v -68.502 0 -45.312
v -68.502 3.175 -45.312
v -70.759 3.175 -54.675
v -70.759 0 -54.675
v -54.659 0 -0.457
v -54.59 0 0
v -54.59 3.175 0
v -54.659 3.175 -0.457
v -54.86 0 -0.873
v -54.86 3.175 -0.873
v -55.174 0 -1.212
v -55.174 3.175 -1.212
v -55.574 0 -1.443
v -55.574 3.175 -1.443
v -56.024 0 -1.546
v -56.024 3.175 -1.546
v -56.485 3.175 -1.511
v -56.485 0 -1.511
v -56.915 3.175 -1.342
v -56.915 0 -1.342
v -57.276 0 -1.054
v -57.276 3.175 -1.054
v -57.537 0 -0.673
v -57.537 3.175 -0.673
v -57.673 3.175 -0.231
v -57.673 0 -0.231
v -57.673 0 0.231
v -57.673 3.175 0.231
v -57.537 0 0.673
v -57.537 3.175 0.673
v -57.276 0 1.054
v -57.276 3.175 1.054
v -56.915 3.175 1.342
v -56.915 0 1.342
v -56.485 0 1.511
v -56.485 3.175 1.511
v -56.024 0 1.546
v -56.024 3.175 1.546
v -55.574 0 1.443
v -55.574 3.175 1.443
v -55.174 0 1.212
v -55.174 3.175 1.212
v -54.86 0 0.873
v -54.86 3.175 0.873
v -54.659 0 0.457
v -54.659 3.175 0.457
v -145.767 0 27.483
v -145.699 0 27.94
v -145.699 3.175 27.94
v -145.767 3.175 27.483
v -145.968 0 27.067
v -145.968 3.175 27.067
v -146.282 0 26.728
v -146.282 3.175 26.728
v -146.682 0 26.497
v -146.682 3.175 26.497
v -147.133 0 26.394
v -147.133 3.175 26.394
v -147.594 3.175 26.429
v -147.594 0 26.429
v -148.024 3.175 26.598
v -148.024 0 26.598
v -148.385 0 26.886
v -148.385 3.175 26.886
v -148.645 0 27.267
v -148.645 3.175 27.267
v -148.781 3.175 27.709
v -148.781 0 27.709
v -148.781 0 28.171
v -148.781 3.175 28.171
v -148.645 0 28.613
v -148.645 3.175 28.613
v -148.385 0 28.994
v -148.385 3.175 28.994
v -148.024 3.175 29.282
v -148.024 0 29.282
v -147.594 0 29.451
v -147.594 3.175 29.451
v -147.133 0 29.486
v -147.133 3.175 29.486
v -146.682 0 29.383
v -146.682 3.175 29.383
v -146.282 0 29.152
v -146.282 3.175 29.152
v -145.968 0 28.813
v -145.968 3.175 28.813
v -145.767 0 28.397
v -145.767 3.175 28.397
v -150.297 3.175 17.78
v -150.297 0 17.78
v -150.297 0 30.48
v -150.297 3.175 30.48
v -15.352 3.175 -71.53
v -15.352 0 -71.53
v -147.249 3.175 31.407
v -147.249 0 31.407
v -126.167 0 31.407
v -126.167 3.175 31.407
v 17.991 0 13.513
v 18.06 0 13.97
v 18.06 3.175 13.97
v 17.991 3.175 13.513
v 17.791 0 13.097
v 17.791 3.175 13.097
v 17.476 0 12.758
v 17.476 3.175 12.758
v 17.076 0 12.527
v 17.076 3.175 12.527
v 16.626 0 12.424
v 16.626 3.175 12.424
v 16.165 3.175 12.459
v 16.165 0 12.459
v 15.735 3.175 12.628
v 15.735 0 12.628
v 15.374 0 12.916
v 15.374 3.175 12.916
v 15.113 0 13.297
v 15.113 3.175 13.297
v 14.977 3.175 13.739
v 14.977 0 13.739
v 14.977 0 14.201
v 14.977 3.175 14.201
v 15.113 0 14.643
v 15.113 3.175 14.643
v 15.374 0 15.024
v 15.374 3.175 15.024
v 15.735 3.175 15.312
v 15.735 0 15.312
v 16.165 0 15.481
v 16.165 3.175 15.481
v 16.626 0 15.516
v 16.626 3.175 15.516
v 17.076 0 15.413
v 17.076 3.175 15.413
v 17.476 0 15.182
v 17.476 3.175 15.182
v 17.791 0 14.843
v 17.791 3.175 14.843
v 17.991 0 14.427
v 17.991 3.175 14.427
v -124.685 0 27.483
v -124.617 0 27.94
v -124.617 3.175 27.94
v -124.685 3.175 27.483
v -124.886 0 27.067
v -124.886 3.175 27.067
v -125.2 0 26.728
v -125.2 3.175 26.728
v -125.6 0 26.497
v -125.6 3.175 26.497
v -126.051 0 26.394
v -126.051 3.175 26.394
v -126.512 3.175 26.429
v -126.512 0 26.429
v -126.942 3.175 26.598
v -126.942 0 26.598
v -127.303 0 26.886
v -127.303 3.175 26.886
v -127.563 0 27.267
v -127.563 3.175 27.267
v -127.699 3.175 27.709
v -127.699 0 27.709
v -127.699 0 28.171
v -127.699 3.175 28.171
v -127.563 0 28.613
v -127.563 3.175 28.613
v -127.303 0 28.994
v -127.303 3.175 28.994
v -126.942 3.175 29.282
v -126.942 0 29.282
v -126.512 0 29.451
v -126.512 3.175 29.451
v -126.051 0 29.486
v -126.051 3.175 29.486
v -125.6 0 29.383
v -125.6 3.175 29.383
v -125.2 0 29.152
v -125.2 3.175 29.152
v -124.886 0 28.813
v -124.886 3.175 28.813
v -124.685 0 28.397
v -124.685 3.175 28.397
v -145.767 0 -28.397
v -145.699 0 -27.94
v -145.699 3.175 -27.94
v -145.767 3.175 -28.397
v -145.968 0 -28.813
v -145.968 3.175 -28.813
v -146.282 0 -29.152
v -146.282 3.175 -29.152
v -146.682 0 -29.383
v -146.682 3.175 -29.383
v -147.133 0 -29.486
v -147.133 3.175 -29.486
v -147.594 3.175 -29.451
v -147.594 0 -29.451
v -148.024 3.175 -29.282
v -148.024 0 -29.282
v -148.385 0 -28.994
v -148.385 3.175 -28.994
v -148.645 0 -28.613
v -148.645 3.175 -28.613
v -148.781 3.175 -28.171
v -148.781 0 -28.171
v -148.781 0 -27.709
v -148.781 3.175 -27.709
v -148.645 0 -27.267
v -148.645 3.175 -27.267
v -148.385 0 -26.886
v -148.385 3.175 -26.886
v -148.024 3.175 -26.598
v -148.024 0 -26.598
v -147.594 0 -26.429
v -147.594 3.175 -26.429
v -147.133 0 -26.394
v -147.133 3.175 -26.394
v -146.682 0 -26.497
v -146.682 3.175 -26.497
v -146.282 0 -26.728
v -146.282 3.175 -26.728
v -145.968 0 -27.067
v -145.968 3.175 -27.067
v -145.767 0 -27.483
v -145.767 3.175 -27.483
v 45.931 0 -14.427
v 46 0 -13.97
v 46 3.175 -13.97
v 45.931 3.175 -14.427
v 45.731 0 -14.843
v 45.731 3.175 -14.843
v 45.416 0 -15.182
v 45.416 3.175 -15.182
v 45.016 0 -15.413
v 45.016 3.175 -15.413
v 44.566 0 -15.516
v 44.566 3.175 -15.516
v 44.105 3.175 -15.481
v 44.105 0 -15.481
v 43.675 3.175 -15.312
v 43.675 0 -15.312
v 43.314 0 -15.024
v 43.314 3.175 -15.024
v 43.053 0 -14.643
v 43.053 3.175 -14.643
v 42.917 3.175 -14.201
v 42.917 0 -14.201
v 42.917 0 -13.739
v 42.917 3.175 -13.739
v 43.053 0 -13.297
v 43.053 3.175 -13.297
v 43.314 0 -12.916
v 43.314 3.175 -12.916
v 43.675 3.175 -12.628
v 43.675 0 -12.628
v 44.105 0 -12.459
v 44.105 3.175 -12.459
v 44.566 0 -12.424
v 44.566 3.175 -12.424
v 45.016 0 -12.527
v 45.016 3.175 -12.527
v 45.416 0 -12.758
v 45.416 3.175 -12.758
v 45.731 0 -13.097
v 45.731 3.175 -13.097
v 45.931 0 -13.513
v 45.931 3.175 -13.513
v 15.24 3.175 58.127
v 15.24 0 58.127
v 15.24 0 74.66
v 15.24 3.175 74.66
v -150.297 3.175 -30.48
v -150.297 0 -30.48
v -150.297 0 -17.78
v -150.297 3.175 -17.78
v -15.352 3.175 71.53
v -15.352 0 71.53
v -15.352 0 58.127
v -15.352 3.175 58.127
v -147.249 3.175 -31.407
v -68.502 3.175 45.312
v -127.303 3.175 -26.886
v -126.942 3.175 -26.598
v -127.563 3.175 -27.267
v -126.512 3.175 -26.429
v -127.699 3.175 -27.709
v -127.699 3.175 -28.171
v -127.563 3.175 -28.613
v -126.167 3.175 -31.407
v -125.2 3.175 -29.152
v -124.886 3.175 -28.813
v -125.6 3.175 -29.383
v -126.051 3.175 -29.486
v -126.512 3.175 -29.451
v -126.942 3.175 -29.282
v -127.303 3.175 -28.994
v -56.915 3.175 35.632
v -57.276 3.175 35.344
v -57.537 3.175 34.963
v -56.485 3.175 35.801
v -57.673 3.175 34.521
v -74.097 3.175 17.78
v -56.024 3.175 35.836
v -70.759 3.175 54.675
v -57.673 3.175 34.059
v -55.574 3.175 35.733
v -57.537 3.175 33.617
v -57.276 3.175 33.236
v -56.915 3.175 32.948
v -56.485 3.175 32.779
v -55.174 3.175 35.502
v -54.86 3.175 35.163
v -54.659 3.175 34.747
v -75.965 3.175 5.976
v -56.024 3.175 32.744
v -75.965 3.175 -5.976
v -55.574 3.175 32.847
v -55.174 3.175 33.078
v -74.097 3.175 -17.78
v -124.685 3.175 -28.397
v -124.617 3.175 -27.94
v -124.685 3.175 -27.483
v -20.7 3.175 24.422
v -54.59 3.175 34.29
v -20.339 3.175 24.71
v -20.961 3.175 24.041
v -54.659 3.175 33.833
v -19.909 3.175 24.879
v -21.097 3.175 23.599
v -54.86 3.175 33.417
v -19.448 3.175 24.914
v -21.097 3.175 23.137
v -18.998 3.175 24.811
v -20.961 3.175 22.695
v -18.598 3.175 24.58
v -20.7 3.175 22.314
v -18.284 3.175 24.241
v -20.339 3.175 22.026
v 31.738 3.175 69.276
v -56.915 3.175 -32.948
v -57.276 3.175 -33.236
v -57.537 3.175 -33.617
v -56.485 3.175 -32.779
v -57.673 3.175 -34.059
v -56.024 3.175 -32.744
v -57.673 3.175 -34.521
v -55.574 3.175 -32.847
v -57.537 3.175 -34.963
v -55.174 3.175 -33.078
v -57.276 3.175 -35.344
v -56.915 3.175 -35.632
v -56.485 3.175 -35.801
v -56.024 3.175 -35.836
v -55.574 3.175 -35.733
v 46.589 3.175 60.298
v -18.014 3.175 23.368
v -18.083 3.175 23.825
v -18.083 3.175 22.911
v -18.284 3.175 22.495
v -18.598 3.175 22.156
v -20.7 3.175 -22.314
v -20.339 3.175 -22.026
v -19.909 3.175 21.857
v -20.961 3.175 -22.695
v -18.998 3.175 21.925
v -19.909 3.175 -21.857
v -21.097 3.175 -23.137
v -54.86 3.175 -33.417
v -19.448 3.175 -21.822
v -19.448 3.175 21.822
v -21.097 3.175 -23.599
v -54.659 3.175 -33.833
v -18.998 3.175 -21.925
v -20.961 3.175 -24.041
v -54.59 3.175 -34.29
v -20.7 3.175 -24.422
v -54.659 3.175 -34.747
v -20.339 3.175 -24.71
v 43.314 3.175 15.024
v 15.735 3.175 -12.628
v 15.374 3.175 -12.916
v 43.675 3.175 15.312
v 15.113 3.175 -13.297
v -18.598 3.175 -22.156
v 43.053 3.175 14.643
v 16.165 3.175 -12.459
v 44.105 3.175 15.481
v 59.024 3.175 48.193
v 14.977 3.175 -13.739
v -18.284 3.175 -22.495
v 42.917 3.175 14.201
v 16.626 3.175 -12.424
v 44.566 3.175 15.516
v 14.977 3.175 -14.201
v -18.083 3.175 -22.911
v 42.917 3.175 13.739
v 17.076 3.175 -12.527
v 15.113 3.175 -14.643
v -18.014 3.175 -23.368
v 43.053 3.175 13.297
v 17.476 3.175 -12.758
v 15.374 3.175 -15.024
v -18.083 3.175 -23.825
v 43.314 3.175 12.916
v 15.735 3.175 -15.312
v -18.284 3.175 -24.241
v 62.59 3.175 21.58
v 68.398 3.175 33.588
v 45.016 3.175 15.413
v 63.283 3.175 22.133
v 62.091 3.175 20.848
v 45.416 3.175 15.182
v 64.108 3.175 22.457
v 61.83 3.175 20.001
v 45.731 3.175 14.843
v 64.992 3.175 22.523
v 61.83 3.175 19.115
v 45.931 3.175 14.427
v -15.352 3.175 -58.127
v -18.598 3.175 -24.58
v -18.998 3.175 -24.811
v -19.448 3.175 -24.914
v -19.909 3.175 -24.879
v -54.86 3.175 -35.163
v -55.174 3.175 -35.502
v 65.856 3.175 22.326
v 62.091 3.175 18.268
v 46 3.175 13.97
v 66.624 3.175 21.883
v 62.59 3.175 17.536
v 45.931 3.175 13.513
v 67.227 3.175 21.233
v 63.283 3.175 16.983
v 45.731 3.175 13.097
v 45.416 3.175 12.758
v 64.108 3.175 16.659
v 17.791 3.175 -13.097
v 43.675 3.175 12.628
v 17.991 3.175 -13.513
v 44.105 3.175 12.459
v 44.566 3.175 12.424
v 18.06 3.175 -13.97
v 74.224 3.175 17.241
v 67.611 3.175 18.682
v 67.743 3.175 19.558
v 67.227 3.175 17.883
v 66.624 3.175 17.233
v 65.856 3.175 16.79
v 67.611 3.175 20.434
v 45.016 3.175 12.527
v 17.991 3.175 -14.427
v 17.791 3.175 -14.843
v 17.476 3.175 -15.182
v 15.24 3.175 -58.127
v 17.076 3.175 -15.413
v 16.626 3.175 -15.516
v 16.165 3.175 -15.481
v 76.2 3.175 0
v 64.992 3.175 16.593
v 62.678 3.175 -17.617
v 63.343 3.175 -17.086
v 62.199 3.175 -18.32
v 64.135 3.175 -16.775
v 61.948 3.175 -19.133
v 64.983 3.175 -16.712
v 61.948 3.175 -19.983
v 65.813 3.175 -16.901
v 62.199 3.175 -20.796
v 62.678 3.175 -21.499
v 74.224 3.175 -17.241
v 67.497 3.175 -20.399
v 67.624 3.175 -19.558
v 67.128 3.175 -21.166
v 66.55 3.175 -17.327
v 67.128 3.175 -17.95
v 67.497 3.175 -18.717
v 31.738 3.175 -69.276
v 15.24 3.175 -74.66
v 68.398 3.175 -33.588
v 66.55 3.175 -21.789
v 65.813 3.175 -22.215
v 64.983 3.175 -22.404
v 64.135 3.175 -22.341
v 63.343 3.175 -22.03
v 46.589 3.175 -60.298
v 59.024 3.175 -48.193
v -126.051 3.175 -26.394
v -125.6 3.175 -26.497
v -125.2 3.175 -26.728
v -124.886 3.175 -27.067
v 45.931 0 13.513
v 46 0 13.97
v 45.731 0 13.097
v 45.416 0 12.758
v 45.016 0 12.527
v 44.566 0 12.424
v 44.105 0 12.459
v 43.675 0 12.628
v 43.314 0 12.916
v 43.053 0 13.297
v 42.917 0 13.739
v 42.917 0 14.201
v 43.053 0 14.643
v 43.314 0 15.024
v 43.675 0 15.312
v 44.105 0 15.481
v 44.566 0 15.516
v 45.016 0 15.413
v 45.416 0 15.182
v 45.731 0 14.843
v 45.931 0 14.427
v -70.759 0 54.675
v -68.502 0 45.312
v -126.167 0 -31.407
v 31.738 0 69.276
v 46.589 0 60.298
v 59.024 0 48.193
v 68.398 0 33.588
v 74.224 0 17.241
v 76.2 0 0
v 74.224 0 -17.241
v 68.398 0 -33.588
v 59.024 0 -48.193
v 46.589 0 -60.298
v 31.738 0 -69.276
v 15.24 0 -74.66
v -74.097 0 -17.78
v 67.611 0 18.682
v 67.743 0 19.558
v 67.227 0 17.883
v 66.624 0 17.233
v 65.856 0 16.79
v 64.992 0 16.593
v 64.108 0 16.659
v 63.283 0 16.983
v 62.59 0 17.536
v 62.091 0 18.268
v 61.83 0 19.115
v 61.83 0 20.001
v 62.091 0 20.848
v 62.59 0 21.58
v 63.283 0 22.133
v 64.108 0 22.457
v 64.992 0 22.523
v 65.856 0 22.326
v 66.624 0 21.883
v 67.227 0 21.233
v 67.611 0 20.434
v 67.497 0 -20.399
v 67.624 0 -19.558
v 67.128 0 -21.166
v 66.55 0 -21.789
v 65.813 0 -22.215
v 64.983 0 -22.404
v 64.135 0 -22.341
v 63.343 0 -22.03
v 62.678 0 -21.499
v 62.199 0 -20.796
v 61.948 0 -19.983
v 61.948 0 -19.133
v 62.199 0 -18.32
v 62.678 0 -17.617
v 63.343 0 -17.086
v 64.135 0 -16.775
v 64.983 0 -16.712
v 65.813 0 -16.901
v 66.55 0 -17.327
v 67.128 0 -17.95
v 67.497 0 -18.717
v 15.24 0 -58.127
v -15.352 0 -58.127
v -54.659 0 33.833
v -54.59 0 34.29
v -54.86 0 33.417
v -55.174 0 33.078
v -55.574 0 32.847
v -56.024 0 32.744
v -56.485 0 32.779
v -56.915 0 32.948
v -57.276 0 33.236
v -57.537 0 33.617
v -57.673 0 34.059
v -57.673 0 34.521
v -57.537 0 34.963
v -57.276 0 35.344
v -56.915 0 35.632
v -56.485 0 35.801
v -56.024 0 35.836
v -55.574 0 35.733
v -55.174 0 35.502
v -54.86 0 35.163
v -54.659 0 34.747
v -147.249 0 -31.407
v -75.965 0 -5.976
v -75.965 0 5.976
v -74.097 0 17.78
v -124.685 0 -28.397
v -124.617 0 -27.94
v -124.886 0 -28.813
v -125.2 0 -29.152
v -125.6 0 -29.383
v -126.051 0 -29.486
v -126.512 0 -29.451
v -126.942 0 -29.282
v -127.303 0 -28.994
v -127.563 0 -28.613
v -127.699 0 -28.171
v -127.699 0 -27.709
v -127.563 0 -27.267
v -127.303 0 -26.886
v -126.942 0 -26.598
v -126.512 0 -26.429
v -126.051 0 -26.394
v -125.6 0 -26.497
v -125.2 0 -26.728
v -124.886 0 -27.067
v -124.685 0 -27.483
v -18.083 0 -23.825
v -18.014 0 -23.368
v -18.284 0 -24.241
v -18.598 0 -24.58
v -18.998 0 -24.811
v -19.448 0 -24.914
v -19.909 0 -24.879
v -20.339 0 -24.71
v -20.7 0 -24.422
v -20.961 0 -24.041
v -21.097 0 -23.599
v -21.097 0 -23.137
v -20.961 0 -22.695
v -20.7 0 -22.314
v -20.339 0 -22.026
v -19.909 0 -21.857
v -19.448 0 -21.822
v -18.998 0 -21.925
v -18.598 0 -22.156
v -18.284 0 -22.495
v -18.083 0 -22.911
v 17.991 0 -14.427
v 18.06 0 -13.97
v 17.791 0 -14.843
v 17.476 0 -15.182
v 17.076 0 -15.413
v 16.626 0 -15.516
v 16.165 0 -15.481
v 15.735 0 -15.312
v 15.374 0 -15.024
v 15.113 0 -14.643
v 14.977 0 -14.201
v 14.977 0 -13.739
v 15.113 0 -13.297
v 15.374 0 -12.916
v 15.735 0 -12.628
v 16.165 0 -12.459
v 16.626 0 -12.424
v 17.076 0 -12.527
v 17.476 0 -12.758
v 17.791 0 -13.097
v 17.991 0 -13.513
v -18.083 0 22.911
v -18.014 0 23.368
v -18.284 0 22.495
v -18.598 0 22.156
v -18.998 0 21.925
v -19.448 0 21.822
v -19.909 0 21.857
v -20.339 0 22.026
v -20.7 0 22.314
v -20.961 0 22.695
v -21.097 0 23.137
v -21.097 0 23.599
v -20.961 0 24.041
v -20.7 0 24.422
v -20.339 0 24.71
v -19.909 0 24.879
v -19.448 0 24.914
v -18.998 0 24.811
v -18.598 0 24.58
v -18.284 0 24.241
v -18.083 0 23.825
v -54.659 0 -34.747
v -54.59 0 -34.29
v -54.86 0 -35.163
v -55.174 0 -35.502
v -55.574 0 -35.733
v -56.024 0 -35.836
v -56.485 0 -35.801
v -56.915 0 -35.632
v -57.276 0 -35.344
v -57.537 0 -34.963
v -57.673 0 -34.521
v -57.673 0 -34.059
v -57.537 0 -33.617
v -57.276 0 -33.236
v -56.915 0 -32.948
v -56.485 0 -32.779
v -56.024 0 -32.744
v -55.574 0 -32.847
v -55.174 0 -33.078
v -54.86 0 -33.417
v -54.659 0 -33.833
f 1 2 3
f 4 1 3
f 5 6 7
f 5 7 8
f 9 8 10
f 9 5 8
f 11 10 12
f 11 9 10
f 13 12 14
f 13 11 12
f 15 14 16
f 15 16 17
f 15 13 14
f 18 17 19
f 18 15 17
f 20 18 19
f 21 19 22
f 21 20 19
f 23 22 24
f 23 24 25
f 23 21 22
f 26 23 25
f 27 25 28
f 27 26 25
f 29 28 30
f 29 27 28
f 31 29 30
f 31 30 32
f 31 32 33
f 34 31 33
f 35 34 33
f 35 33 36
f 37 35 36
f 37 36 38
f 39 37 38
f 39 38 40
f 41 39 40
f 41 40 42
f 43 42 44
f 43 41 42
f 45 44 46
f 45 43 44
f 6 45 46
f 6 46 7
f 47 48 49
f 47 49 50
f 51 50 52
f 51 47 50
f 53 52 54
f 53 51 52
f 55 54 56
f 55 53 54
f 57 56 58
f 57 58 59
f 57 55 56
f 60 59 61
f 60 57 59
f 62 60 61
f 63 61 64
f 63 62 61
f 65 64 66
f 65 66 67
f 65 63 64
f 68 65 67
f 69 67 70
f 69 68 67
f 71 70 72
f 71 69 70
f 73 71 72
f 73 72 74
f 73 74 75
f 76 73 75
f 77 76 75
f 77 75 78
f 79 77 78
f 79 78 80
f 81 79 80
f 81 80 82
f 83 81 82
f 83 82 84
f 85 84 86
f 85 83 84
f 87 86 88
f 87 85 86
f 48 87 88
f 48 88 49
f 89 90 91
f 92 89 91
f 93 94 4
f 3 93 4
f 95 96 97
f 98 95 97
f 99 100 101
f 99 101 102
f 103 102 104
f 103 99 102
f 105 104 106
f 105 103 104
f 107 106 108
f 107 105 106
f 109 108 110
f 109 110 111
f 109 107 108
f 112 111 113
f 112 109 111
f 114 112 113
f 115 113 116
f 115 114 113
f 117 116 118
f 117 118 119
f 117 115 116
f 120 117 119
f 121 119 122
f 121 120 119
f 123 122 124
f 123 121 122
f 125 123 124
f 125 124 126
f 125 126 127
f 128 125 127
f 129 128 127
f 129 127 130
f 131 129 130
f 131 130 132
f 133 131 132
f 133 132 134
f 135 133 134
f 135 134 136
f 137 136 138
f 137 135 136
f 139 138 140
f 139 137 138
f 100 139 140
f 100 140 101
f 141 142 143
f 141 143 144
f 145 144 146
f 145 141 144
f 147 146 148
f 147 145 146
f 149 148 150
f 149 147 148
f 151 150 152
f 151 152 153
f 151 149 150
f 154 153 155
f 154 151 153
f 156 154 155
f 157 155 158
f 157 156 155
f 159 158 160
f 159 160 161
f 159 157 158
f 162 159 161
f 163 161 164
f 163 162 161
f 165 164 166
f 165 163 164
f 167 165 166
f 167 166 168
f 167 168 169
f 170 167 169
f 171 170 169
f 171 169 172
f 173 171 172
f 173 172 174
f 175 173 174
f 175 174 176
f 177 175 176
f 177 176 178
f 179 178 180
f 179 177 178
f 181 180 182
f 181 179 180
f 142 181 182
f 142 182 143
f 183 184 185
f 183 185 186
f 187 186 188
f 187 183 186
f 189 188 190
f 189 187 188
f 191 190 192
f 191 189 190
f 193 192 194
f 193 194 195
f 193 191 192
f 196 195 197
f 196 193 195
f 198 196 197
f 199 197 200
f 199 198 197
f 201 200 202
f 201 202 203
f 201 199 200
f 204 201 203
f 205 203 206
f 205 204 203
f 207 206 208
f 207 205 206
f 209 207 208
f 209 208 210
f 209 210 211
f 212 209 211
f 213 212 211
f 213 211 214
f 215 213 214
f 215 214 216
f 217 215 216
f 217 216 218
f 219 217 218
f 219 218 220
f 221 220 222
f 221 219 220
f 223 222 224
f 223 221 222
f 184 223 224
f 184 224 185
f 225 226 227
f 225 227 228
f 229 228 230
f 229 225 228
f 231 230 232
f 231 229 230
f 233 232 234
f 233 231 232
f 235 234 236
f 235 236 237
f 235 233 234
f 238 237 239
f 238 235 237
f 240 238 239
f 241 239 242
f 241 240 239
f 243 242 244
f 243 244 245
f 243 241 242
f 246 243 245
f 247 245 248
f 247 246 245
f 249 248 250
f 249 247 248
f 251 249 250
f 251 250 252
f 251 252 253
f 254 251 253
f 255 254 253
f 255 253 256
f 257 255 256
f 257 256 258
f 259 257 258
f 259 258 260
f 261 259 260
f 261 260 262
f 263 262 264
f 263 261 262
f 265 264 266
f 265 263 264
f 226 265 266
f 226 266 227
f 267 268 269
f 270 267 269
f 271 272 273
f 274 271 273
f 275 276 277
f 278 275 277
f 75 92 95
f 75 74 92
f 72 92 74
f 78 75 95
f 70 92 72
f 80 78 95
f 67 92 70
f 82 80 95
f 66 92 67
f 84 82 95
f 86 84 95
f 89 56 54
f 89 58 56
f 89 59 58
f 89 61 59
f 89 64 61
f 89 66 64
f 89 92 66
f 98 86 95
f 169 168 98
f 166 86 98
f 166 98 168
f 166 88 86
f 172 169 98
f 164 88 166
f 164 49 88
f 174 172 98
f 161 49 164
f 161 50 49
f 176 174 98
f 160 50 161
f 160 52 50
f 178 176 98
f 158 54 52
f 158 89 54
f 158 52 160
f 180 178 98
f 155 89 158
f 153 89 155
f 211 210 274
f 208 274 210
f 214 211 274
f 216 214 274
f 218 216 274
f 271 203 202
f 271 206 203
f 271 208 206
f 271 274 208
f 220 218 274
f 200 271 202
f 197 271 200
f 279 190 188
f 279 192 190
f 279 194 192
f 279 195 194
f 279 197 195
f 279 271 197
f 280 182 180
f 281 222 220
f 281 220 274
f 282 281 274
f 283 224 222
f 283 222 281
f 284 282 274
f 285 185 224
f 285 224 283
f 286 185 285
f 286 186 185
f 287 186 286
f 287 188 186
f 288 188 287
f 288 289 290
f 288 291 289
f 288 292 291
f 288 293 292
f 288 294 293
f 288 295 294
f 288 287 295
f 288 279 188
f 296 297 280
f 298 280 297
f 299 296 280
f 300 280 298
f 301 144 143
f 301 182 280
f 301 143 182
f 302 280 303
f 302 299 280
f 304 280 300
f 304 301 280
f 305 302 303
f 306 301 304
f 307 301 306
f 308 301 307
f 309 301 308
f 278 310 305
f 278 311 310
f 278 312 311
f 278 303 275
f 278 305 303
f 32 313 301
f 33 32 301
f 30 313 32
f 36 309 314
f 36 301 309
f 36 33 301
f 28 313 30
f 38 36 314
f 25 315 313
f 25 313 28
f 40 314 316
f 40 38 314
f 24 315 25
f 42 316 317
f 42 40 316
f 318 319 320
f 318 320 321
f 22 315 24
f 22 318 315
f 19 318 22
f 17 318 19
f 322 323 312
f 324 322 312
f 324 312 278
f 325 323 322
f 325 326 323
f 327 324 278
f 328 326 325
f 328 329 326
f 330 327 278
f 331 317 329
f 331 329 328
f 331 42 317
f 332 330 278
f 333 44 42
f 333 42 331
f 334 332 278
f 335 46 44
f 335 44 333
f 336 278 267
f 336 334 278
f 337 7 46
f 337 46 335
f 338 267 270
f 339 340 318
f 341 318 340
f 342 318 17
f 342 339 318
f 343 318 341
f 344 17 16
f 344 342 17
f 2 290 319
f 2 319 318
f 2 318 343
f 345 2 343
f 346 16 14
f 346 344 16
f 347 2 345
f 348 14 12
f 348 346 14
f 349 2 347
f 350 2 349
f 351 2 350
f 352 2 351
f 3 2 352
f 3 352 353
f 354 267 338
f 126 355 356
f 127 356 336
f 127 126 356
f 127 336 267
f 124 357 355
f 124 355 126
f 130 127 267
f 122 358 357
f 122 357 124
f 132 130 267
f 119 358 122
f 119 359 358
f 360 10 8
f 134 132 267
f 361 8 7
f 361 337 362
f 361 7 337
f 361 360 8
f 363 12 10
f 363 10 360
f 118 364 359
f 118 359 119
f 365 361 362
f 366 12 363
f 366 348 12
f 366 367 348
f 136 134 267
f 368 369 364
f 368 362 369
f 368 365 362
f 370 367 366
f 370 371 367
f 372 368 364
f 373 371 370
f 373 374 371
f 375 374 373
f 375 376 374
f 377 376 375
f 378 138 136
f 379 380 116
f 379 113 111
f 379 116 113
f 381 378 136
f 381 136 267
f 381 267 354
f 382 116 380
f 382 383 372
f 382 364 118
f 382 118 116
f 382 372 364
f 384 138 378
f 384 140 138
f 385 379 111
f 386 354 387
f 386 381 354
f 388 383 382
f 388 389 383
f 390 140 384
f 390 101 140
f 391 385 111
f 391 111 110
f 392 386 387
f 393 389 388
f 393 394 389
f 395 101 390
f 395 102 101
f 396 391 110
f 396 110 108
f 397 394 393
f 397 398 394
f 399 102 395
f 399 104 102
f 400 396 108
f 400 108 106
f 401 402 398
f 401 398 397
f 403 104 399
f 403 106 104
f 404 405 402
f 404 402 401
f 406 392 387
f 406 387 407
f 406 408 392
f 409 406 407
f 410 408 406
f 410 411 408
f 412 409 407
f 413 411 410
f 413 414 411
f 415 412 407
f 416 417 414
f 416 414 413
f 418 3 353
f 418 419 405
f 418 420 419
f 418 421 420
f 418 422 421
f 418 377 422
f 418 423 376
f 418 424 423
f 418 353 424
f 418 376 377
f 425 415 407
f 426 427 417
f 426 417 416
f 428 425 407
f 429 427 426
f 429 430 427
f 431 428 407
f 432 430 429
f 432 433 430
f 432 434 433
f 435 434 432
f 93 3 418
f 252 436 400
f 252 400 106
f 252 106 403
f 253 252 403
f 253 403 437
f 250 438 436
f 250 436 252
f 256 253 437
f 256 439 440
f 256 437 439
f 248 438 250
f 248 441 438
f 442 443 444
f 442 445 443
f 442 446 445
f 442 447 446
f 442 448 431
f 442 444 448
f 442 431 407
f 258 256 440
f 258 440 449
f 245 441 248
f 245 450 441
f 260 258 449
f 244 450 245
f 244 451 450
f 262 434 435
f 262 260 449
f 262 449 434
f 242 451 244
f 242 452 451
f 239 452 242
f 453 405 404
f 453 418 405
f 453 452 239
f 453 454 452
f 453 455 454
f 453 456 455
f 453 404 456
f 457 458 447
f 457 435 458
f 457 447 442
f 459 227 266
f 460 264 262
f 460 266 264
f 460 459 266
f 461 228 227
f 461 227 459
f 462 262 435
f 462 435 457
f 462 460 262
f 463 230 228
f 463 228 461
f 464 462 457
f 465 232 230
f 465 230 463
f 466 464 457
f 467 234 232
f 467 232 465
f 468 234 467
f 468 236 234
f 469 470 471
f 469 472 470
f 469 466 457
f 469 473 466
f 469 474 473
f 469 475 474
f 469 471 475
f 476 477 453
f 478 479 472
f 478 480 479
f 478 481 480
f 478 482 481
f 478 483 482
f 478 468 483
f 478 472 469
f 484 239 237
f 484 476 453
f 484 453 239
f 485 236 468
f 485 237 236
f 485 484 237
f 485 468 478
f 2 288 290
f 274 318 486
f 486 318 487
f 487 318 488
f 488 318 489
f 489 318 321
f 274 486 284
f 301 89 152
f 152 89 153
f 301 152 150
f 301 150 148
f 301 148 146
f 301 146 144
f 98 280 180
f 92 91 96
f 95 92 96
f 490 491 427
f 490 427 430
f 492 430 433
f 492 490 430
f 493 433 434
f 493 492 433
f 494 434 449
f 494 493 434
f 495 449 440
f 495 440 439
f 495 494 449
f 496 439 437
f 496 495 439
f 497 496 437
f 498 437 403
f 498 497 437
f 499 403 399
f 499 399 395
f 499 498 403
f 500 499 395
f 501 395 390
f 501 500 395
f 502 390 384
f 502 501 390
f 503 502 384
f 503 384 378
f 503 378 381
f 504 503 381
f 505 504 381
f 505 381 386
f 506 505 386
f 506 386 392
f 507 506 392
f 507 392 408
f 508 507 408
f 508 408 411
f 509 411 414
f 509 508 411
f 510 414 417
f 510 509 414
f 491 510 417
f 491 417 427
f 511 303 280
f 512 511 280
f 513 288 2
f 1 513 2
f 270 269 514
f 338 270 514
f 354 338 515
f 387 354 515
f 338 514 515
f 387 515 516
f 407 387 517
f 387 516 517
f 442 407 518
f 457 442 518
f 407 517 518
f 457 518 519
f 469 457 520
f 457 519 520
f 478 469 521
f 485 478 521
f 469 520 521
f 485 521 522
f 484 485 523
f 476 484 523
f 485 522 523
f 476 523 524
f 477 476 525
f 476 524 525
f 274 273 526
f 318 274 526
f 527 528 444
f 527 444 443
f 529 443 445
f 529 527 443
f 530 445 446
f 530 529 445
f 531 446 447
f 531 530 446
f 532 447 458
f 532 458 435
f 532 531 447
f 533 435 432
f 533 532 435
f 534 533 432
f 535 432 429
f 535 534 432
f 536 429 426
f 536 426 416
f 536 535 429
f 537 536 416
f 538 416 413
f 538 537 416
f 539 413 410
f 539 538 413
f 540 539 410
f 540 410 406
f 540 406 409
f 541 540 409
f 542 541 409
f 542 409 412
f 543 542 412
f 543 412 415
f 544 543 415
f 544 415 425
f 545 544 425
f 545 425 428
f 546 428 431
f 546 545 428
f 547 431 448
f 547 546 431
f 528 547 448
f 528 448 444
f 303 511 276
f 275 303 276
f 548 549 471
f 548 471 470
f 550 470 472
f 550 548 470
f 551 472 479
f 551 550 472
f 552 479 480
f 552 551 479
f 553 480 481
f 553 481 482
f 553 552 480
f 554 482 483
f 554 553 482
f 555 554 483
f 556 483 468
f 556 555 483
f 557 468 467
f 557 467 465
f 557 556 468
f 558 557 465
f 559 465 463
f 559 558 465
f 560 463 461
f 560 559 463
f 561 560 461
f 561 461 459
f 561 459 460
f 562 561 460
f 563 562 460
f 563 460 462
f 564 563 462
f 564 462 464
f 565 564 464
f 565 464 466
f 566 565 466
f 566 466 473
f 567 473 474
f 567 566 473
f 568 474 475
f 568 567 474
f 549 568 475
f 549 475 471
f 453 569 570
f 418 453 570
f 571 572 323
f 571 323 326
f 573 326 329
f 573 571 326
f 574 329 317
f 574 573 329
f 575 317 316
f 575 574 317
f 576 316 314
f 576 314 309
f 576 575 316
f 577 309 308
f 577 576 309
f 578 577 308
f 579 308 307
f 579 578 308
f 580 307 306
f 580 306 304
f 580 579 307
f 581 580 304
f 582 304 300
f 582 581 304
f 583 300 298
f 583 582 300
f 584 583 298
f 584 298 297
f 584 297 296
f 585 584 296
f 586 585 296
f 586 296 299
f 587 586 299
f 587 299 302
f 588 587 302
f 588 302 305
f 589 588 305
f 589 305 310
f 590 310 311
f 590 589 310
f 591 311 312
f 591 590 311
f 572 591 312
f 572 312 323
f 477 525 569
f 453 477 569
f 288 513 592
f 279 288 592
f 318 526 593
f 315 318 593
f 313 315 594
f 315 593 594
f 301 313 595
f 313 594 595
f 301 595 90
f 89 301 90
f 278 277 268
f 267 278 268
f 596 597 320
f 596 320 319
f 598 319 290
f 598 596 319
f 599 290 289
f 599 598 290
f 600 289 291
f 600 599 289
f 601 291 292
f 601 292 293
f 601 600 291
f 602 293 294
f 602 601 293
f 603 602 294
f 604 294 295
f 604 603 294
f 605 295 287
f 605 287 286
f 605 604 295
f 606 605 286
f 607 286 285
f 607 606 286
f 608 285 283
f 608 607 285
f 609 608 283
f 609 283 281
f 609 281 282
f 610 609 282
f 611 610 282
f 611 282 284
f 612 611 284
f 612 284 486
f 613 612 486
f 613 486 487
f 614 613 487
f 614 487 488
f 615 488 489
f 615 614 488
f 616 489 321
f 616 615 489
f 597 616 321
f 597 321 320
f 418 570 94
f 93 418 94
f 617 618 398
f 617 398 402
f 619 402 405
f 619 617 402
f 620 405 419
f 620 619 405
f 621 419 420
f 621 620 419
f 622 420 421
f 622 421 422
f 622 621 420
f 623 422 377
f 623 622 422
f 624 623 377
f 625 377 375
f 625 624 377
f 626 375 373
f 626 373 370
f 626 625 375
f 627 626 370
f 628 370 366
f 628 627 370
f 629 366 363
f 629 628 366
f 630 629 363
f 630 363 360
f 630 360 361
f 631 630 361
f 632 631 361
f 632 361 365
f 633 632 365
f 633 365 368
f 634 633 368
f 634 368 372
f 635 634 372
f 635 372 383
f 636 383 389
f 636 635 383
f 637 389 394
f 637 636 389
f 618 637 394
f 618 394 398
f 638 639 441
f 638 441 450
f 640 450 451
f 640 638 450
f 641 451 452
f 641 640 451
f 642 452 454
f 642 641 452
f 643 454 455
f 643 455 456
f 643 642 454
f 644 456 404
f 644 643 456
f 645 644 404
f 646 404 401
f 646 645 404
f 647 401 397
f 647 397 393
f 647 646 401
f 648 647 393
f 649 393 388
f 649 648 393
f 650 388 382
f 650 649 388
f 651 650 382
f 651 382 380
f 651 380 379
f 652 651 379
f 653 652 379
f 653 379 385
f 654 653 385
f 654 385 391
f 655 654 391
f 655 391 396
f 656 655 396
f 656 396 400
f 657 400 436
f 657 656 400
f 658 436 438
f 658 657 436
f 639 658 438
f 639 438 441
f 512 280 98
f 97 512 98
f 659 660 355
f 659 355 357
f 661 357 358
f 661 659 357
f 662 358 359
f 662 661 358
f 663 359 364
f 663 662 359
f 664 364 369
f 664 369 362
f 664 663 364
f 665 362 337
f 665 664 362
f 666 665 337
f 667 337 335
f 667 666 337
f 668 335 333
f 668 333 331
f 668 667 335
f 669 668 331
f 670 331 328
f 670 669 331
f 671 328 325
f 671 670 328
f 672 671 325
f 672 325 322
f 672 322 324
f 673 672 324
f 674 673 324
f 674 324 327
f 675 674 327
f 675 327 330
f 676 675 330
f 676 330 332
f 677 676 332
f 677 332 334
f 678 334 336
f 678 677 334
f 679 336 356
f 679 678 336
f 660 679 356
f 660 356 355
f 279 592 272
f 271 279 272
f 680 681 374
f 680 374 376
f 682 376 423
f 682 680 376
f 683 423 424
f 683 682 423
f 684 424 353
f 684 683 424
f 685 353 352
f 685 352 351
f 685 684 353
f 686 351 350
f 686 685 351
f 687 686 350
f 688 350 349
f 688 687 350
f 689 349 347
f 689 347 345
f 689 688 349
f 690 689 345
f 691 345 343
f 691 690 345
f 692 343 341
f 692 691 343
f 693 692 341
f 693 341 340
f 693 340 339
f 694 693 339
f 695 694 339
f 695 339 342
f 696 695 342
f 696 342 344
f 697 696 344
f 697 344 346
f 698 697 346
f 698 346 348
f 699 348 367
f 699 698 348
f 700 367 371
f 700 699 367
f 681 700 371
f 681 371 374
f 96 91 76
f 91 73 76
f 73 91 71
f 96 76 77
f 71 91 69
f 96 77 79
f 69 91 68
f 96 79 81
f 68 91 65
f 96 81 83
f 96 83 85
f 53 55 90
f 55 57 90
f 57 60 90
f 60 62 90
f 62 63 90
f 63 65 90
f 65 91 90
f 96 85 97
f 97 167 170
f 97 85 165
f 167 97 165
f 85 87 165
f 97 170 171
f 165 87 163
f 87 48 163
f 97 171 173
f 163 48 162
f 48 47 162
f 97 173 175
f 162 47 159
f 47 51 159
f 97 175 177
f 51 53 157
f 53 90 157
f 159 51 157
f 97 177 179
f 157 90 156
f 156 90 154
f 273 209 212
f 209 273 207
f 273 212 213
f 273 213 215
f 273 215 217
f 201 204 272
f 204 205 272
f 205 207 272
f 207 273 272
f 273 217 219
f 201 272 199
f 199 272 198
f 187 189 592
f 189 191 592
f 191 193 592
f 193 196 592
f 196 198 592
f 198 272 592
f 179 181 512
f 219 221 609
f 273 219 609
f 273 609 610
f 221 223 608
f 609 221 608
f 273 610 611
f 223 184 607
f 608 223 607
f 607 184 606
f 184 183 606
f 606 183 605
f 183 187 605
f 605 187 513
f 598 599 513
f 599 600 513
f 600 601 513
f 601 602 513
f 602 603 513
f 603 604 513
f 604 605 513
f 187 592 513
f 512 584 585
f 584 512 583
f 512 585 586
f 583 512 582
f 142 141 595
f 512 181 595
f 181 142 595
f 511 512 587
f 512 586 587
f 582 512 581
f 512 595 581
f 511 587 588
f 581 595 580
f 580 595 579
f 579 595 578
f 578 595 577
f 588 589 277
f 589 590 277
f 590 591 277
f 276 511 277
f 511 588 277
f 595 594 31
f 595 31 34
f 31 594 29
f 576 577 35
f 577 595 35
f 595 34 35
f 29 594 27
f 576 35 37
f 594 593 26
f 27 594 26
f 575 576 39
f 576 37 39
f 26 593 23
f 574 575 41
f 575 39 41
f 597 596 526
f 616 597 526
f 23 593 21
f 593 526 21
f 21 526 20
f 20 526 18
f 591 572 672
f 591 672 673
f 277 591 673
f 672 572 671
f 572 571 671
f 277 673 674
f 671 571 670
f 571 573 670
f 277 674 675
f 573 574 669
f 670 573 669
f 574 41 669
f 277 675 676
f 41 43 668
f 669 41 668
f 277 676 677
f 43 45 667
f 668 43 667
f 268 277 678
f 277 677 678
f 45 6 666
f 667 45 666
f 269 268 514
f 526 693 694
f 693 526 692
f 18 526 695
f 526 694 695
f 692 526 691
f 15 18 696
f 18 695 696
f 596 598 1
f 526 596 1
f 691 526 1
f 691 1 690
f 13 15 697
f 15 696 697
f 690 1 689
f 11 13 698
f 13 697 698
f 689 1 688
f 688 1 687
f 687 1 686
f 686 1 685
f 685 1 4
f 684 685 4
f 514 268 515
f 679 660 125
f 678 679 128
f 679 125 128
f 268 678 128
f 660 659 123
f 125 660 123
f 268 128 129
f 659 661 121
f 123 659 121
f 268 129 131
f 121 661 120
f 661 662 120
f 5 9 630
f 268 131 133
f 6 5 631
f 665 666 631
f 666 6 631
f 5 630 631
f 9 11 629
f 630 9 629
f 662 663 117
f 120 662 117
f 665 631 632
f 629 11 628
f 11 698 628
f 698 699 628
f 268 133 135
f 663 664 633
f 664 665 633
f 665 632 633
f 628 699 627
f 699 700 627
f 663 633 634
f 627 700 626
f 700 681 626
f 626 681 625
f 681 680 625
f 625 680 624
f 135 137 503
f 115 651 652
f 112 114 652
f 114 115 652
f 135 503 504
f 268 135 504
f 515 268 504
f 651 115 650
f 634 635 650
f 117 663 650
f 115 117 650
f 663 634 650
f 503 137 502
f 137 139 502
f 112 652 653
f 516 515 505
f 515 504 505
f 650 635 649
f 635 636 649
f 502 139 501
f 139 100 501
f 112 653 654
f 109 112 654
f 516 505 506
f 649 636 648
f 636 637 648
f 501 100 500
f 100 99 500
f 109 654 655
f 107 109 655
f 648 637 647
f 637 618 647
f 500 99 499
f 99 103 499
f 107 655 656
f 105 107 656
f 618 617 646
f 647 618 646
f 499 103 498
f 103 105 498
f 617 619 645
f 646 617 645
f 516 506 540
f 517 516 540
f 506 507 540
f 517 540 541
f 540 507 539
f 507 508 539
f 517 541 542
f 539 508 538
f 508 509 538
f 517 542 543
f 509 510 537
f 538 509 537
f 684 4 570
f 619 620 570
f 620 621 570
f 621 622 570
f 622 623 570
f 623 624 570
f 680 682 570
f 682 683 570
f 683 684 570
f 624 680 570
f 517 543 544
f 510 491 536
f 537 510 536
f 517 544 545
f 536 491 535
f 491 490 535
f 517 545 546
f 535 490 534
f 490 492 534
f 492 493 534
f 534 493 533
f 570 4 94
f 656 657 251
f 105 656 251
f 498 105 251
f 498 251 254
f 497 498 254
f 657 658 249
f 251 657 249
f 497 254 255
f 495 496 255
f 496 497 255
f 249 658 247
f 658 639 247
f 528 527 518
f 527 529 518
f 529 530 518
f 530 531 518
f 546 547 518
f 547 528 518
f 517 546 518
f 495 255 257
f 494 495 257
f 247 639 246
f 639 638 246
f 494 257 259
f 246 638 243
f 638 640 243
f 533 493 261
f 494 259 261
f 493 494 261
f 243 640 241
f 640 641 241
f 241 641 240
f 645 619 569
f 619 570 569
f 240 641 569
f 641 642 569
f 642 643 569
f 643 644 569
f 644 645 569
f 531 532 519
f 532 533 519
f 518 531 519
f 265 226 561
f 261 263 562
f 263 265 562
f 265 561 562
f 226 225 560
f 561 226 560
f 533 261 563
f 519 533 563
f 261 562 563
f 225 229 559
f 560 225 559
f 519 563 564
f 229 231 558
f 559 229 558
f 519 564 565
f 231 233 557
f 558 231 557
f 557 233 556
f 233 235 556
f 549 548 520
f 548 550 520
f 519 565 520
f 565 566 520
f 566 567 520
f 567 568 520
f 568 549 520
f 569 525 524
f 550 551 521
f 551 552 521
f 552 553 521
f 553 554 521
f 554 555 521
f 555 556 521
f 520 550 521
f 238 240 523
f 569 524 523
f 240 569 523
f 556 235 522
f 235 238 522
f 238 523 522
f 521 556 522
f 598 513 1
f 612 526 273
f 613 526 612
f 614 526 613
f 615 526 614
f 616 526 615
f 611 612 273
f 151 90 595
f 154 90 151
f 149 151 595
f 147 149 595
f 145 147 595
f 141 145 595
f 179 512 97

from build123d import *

# Parameters (mm, degrees)
SKETCH1_R           = 1.55
SKETCH1_R_2         = 2.97333552
SKETCH1_R_3         = 2.85410663
BOSS_EXTRUDE1_DEPTH = 3.175
CUT_EXTRUDE1_DEPTH  = 3.175


with BuildPart() as part:
    # Sketch1 → Boss-Extrude1 (new body)
    with BuildSketch(Plane(origin=(0, 0, 0), x_dir=(1, 0, 0), z_dir=(0, 1, 0))):
        with BuildLine():
            Line((-15.352336135, 71.529843551), (-126.166636901, 37.820307959))
            Line((-126.166636901, 37.820307959), (-126.166636901, 31.407196795))
            Line((-126.166636901, 31.407196795), (-147.248636901, 31.407196795))
            Line((-147.248636901, 31.407196795), (-150.296636901, 30.48))
            Line((-150.296636901, 30.48), (-150.296636901, 17.78))
            Line((-150.296636901, 17.78), (-74.096636901, 17.78))
            ThreePointArc((-74.096636901, 17.78), (-76.2, 0), (-74.096636901, -17.78))
            Line((-74.096636901, -17.78), (-150.296636901, -17.78))
            Line((-150.296636901, -17.78), (-150.296636901, -30.48))
            Line((-150.296636901, -30.48), (-147.248636901, -31.407196795))
            Line((-147.248636901, -31.407196795), (-126.166636901, -31.407196795))
            Line((-126.166636901, -31.407196795), (-126.166636901, -37.820307959))
            Line((-126.166636901, -37.820307959), (-15.352336135, -71.529843551))
            Line((-15.352336135, -71.529843551), (-15.352336135, -58.127428782))
            Line((-15.352336135, -58.127428782), (15.24, -58.127428782))
            Line((15.24, -58.127428782), (15.24, -74.66044736))
            ThreePointArc((15.24, -74.66044736), (76.2, 0), (15.24, 74.66044736))
            Line((15.24, 74.66044736), (15.24, 58.127428782))
            Line((15.24, 58.127428782), (-15.352336135, 58.127428782))
            Line((-15.352336135, 58.127428782), (-15.352336135, 71.529843551))
        make_face()
        with Locations((-56.1402016, 0)):
            Circle(SKETCH1_R, mode=Mode.SUBTRACT)
        with Locations((-19.5642016, -23.368)):
            Circle(SKETCH1_R, mode=Mode.SUBTRACT)
        with Locations((64.77, -19.558)):
            Circle(SKETCH1_R_2, mode=Mode.SUBTRACT)
        with Locations((16.51, -13.97)):
            Circle(SKETCH1_R, mode=Mode.SUBTRACT)
        with Locations((44.45, -13.97)):
            Circle(SKETCH1_R, mode=Mode.SUBTRACT)
        with Locations((-147.248636901, 27.94)):
            Circle(SKETCH1_R, mode=Mode.SUBTRACT)
        with Locations((-126.166636901, 27.94)):
            Circle(SKETCH1_R, mode=Mode.SUBTRACT)
        with Locations((-56.1402016, 34.29)):
            Circle(SKETCH1_R, mode=Mode.SUBTRACT)
        with Locations((16.51, 13.97)):
            Circle(SKETCH1_R, mode=Mode.SUBTRACT)
        with Locations((44.45, 13.97)):
            Circle(SKETCH1_R, mode=Mode.SUBTRACT)
        with Locations((64.77, 19.558)):
            Circle(SKETCH1_R_3, mode=Mode.SUBTRACT)
        with Locations((-19.5642016, 23.368)):
            Circle(SKETCH1_R, mode=Mode.SUBTRACT)
        with Locations((-56.1402016, -34.29)):
            Circle(SKETCH1_R, mode=Mode.SUBTRACT)
        with Locations((-126.166636901, -27.94)):
            Circle(SKETCH1_R, mode=Mode.SUBTRACT)
        with Locations((-147.248636901, -27.94)):
            Circle(SKETCH1_R, mode=Mode.SUBTRACT)
    extrude(amount=BOSS_EXTRUDE1_DEPTH)

    # Sketch2 → Cut-Extrude1 (cut)
    with BuildSketch(Plane(origin=(0, 3.175, 0), x_dir=(1, 0, 0), z_dir=(0, 1, 0))):
        Polygon((-126.166636901, 31.407196795), (-68.501735058, 45.311715833), (-70.759486518, 54.675075755), (-126.166636901, 37.820307959), align=None)
        Polygon((-68.501735058, -45.311715833), (-126.166636901, -31.407196795), (-126.166636901, -37.820307959), (-70.759486518, -54.675075755), align=None)
    extrude(amount=-CUT_EXTRUDE1_DEPTH, mode=Mode.SUBTRACT)


solid = part.part
